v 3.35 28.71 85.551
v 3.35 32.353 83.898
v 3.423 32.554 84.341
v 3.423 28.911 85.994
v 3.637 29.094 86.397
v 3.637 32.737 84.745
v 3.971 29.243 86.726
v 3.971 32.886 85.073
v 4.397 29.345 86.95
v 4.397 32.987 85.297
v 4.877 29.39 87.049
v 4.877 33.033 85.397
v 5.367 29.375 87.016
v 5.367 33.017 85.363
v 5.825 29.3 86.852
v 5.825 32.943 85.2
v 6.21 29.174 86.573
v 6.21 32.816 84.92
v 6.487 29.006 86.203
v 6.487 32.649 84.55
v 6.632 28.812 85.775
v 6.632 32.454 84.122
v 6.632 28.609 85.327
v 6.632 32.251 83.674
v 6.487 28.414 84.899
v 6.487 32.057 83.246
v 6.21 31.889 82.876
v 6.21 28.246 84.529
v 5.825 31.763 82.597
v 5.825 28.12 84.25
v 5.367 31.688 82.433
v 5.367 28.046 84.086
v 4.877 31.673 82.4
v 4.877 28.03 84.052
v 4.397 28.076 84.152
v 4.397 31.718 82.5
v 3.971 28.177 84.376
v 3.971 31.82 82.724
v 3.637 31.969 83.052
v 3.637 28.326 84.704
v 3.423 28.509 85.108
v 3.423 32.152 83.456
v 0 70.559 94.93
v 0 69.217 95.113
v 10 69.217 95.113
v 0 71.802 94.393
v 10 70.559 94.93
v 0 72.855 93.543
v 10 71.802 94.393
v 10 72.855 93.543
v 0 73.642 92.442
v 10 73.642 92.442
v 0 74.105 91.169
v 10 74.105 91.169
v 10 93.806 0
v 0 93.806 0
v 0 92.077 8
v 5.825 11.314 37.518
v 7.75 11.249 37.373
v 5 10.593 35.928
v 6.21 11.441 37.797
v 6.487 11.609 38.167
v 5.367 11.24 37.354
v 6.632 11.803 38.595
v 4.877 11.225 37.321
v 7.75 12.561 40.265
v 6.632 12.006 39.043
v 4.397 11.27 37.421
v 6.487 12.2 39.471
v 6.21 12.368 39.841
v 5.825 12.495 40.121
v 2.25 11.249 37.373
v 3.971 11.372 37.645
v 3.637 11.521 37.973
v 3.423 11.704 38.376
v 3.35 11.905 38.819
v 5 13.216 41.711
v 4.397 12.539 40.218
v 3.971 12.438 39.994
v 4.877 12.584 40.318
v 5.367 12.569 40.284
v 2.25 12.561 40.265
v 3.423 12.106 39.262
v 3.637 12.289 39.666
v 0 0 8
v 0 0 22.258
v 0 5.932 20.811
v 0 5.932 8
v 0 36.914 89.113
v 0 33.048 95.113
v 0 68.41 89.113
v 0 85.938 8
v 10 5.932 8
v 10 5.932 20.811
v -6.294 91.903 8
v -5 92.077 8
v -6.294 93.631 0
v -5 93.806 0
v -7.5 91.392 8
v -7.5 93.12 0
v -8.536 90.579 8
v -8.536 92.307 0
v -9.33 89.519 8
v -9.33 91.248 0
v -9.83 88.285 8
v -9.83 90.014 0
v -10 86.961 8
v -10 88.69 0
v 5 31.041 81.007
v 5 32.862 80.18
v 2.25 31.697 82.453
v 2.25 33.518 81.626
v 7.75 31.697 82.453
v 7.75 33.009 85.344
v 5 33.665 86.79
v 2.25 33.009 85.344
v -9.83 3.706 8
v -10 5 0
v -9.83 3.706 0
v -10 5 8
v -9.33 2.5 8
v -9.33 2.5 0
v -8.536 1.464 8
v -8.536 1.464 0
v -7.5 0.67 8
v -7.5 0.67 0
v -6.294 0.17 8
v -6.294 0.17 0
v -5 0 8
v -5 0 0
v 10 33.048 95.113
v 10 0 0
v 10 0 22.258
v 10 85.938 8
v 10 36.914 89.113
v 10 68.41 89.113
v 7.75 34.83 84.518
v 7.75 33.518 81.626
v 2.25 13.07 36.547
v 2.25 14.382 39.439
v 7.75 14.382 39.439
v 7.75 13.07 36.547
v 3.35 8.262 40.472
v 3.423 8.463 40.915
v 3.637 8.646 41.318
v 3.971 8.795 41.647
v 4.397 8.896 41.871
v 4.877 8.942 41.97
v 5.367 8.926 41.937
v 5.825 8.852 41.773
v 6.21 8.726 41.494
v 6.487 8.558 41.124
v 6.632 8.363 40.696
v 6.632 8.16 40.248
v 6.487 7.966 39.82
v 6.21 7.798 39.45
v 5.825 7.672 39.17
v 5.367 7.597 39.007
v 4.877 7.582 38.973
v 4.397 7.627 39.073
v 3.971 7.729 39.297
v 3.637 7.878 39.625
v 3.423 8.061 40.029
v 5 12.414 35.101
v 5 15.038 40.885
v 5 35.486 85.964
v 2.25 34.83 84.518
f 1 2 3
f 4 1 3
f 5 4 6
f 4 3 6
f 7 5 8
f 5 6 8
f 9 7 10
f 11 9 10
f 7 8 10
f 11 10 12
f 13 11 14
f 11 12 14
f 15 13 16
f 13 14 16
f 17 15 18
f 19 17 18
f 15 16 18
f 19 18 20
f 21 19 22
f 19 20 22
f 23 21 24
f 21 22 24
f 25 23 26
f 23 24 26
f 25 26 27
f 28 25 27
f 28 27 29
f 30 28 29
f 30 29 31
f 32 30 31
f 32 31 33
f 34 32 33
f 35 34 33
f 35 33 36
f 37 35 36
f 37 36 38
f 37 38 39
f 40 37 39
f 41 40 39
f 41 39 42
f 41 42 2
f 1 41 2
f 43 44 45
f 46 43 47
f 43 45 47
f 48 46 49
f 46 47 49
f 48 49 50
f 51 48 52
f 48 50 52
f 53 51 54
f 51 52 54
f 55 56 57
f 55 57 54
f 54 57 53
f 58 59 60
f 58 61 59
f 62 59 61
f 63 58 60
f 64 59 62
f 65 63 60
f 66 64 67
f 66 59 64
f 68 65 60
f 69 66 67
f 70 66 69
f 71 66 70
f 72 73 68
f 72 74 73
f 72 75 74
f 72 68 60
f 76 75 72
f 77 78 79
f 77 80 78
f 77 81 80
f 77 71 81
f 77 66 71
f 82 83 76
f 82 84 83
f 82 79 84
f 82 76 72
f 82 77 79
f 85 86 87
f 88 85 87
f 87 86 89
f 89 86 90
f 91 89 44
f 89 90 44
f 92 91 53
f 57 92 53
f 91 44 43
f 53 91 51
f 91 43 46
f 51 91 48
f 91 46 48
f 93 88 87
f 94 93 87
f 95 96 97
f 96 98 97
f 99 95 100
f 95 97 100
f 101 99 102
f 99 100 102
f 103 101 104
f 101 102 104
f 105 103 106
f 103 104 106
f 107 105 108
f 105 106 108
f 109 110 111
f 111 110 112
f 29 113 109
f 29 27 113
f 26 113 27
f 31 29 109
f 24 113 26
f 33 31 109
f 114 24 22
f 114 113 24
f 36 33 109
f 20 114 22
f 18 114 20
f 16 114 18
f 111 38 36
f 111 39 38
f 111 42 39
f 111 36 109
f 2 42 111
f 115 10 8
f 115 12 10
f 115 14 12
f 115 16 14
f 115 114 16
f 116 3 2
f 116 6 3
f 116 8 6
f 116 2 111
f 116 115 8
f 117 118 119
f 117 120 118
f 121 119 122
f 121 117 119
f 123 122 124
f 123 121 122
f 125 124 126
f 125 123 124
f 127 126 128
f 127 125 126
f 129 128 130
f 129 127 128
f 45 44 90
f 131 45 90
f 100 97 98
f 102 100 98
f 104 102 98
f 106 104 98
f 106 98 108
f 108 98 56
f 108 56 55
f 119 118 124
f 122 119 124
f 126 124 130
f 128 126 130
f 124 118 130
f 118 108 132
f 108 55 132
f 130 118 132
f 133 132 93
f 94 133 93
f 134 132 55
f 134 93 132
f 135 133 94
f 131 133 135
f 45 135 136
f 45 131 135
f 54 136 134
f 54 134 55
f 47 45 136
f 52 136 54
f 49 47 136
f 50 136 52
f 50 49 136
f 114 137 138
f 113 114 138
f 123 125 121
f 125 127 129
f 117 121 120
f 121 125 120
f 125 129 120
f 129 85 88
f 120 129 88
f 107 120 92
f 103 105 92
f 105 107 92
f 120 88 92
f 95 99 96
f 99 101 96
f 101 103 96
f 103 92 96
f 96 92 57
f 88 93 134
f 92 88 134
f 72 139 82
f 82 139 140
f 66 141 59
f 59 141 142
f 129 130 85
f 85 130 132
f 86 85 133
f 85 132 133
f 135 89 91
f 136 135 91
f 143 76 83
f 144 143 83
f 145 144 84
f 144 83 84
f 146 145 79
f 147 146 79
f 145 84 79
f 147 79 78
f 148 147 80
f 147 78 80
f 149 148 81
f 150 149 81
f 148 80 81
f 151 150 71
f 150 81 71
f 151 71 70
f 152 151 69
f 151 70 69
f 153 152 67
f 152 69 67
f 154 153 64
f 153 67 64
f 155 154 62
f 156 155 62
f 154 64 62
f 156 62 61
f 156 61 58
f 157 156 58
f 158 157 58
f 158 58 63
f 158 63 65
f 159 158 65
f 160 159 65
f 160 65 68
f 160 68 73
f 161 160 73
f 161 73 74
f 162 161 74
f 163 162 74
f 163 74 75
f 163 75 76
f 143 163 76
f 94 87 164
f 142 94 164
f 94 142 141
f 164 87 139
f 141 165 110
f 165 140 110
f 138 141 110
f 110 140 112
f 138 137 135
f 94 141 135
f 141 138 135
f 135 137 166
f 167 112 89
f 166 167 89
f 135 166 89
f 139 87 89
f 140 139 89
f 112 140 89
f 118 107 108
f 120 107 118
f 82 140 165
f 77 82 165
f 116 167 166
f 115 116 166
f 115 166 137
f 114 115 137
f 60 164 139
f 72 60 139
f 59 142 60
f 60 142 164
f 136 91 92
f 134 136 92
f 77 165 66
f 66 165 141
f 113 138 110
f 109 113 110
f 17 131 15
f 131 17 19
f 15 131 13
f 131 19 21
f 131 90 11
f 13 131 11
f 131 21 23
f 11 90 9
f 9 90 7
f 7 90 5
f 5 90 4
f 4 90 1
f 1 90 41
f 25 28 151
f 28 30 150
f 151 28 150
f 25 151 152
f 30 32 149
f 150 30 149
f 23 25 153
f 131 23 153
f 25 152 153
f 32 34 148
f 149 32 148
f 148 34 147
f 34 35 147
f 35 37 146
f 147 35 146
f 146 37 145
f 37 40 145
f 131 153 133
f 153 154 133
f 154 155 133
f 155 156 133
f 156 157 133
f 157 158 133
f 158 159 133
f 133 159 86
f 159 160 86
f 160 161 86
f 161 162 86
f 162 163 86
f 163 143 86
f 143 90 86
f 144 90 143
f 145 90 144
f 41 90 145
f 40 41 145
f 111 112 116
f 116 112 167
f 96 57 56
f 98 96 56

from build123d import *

# Parameters (mm, degrees)
F1_DEPTH = 10
F3_DEPTH = 10
F4_R     = 5
F6_D     = 3.3
F6_DEPTH = 10
F6_TIP   = 0.9914200214
F8_DEPTH = 2


with BuildPart() as f1:
    # F0 (on Right) → F1 (new body)
    with BuildSketch(Plane.YZ):
        Polygon((0, 22.2580076184), (0, 0), (93.8056360581, 0), (73.2522689977, 95.1130465462), (33.0475914831, 95.1130465462), align=None)
        Polygon((68.4103418893, 89.1130465462), (85.9383917163, 8), (5.9322550672, 8), (5.9322550672, 20.8114475514), (36.9143720826, 89.1130465462), align=None, mode=Mode.SUBTRACT)
    extrude(amount=F1_DEPTH)

    # F2 (on face) → F3 (join)
    with BuildSketch(Plane(origin=(0, 0, 0), x_dir=(0, -1, 0), z_dir=(-1, 0, 0))):
        Polygon((-85.9383917163, 8), (-92.0768833533, 8), (-93.8056360581, 0), (0, 0), (0, 8), (-5.9322550672, 8), align=None)
    extrude(amount=F3_DEPTH)

    # F4
    f4_edges = [f1.edges().sort_by_distance(p)[0] for p in [
        (-10, 92.94126, 4),
        (-10, 0, 4),
        (5, 73.252269, 95.113047),
    ]]
    fillet(f4_edges, radius=F4_R)

    # F6
    with Locations(Plane(origin=(0, -8.3734748609, 3.7982709305), x_dir=(1, 0, 0), z_dir=(0, -0.9106879866, 0.4130948935))):
        with Locations((5, 89.7701001437), (5, 40.2701001437)):
            Hole(F6_D / 2, depth=F6_DEPTH)
            with Locations((0, 0, -(F6_DEPTH + F6_TIP / 2))):  # 118° drill point
                Cone(0, F6_D / 2, F6_TIP, mode=Mode.SUBTRACT)

    # F7 (on face) → F8 (cut)
    with BuildSketch(Plane(origin=(0, -2.9093469413, 1.3197015692), x_dir=(-1, 0, 0), z_dir=(0, 0.9106879866, -0.4130948935))):
        Polygon((-7.75, 41.857813384), (-7.75, 38.6823869034), (-5, 37.0946736632), (-2.25, 38.6823869034), (-2.25, 41.857813384), (-5, 43.4455266242), align=None)
        Polygon((-7.75, 91.357813384), (-7.75, 88.1823869034), (-5, 86.5946736632), (-2.25, 88.1823869034), (-2.25, 91.357813384), (-5, 92.9455266242), align=None)
    extrude(amount=-F8_DEPTH, mode=Mode.SUBTRACT)


solid = f1.part
